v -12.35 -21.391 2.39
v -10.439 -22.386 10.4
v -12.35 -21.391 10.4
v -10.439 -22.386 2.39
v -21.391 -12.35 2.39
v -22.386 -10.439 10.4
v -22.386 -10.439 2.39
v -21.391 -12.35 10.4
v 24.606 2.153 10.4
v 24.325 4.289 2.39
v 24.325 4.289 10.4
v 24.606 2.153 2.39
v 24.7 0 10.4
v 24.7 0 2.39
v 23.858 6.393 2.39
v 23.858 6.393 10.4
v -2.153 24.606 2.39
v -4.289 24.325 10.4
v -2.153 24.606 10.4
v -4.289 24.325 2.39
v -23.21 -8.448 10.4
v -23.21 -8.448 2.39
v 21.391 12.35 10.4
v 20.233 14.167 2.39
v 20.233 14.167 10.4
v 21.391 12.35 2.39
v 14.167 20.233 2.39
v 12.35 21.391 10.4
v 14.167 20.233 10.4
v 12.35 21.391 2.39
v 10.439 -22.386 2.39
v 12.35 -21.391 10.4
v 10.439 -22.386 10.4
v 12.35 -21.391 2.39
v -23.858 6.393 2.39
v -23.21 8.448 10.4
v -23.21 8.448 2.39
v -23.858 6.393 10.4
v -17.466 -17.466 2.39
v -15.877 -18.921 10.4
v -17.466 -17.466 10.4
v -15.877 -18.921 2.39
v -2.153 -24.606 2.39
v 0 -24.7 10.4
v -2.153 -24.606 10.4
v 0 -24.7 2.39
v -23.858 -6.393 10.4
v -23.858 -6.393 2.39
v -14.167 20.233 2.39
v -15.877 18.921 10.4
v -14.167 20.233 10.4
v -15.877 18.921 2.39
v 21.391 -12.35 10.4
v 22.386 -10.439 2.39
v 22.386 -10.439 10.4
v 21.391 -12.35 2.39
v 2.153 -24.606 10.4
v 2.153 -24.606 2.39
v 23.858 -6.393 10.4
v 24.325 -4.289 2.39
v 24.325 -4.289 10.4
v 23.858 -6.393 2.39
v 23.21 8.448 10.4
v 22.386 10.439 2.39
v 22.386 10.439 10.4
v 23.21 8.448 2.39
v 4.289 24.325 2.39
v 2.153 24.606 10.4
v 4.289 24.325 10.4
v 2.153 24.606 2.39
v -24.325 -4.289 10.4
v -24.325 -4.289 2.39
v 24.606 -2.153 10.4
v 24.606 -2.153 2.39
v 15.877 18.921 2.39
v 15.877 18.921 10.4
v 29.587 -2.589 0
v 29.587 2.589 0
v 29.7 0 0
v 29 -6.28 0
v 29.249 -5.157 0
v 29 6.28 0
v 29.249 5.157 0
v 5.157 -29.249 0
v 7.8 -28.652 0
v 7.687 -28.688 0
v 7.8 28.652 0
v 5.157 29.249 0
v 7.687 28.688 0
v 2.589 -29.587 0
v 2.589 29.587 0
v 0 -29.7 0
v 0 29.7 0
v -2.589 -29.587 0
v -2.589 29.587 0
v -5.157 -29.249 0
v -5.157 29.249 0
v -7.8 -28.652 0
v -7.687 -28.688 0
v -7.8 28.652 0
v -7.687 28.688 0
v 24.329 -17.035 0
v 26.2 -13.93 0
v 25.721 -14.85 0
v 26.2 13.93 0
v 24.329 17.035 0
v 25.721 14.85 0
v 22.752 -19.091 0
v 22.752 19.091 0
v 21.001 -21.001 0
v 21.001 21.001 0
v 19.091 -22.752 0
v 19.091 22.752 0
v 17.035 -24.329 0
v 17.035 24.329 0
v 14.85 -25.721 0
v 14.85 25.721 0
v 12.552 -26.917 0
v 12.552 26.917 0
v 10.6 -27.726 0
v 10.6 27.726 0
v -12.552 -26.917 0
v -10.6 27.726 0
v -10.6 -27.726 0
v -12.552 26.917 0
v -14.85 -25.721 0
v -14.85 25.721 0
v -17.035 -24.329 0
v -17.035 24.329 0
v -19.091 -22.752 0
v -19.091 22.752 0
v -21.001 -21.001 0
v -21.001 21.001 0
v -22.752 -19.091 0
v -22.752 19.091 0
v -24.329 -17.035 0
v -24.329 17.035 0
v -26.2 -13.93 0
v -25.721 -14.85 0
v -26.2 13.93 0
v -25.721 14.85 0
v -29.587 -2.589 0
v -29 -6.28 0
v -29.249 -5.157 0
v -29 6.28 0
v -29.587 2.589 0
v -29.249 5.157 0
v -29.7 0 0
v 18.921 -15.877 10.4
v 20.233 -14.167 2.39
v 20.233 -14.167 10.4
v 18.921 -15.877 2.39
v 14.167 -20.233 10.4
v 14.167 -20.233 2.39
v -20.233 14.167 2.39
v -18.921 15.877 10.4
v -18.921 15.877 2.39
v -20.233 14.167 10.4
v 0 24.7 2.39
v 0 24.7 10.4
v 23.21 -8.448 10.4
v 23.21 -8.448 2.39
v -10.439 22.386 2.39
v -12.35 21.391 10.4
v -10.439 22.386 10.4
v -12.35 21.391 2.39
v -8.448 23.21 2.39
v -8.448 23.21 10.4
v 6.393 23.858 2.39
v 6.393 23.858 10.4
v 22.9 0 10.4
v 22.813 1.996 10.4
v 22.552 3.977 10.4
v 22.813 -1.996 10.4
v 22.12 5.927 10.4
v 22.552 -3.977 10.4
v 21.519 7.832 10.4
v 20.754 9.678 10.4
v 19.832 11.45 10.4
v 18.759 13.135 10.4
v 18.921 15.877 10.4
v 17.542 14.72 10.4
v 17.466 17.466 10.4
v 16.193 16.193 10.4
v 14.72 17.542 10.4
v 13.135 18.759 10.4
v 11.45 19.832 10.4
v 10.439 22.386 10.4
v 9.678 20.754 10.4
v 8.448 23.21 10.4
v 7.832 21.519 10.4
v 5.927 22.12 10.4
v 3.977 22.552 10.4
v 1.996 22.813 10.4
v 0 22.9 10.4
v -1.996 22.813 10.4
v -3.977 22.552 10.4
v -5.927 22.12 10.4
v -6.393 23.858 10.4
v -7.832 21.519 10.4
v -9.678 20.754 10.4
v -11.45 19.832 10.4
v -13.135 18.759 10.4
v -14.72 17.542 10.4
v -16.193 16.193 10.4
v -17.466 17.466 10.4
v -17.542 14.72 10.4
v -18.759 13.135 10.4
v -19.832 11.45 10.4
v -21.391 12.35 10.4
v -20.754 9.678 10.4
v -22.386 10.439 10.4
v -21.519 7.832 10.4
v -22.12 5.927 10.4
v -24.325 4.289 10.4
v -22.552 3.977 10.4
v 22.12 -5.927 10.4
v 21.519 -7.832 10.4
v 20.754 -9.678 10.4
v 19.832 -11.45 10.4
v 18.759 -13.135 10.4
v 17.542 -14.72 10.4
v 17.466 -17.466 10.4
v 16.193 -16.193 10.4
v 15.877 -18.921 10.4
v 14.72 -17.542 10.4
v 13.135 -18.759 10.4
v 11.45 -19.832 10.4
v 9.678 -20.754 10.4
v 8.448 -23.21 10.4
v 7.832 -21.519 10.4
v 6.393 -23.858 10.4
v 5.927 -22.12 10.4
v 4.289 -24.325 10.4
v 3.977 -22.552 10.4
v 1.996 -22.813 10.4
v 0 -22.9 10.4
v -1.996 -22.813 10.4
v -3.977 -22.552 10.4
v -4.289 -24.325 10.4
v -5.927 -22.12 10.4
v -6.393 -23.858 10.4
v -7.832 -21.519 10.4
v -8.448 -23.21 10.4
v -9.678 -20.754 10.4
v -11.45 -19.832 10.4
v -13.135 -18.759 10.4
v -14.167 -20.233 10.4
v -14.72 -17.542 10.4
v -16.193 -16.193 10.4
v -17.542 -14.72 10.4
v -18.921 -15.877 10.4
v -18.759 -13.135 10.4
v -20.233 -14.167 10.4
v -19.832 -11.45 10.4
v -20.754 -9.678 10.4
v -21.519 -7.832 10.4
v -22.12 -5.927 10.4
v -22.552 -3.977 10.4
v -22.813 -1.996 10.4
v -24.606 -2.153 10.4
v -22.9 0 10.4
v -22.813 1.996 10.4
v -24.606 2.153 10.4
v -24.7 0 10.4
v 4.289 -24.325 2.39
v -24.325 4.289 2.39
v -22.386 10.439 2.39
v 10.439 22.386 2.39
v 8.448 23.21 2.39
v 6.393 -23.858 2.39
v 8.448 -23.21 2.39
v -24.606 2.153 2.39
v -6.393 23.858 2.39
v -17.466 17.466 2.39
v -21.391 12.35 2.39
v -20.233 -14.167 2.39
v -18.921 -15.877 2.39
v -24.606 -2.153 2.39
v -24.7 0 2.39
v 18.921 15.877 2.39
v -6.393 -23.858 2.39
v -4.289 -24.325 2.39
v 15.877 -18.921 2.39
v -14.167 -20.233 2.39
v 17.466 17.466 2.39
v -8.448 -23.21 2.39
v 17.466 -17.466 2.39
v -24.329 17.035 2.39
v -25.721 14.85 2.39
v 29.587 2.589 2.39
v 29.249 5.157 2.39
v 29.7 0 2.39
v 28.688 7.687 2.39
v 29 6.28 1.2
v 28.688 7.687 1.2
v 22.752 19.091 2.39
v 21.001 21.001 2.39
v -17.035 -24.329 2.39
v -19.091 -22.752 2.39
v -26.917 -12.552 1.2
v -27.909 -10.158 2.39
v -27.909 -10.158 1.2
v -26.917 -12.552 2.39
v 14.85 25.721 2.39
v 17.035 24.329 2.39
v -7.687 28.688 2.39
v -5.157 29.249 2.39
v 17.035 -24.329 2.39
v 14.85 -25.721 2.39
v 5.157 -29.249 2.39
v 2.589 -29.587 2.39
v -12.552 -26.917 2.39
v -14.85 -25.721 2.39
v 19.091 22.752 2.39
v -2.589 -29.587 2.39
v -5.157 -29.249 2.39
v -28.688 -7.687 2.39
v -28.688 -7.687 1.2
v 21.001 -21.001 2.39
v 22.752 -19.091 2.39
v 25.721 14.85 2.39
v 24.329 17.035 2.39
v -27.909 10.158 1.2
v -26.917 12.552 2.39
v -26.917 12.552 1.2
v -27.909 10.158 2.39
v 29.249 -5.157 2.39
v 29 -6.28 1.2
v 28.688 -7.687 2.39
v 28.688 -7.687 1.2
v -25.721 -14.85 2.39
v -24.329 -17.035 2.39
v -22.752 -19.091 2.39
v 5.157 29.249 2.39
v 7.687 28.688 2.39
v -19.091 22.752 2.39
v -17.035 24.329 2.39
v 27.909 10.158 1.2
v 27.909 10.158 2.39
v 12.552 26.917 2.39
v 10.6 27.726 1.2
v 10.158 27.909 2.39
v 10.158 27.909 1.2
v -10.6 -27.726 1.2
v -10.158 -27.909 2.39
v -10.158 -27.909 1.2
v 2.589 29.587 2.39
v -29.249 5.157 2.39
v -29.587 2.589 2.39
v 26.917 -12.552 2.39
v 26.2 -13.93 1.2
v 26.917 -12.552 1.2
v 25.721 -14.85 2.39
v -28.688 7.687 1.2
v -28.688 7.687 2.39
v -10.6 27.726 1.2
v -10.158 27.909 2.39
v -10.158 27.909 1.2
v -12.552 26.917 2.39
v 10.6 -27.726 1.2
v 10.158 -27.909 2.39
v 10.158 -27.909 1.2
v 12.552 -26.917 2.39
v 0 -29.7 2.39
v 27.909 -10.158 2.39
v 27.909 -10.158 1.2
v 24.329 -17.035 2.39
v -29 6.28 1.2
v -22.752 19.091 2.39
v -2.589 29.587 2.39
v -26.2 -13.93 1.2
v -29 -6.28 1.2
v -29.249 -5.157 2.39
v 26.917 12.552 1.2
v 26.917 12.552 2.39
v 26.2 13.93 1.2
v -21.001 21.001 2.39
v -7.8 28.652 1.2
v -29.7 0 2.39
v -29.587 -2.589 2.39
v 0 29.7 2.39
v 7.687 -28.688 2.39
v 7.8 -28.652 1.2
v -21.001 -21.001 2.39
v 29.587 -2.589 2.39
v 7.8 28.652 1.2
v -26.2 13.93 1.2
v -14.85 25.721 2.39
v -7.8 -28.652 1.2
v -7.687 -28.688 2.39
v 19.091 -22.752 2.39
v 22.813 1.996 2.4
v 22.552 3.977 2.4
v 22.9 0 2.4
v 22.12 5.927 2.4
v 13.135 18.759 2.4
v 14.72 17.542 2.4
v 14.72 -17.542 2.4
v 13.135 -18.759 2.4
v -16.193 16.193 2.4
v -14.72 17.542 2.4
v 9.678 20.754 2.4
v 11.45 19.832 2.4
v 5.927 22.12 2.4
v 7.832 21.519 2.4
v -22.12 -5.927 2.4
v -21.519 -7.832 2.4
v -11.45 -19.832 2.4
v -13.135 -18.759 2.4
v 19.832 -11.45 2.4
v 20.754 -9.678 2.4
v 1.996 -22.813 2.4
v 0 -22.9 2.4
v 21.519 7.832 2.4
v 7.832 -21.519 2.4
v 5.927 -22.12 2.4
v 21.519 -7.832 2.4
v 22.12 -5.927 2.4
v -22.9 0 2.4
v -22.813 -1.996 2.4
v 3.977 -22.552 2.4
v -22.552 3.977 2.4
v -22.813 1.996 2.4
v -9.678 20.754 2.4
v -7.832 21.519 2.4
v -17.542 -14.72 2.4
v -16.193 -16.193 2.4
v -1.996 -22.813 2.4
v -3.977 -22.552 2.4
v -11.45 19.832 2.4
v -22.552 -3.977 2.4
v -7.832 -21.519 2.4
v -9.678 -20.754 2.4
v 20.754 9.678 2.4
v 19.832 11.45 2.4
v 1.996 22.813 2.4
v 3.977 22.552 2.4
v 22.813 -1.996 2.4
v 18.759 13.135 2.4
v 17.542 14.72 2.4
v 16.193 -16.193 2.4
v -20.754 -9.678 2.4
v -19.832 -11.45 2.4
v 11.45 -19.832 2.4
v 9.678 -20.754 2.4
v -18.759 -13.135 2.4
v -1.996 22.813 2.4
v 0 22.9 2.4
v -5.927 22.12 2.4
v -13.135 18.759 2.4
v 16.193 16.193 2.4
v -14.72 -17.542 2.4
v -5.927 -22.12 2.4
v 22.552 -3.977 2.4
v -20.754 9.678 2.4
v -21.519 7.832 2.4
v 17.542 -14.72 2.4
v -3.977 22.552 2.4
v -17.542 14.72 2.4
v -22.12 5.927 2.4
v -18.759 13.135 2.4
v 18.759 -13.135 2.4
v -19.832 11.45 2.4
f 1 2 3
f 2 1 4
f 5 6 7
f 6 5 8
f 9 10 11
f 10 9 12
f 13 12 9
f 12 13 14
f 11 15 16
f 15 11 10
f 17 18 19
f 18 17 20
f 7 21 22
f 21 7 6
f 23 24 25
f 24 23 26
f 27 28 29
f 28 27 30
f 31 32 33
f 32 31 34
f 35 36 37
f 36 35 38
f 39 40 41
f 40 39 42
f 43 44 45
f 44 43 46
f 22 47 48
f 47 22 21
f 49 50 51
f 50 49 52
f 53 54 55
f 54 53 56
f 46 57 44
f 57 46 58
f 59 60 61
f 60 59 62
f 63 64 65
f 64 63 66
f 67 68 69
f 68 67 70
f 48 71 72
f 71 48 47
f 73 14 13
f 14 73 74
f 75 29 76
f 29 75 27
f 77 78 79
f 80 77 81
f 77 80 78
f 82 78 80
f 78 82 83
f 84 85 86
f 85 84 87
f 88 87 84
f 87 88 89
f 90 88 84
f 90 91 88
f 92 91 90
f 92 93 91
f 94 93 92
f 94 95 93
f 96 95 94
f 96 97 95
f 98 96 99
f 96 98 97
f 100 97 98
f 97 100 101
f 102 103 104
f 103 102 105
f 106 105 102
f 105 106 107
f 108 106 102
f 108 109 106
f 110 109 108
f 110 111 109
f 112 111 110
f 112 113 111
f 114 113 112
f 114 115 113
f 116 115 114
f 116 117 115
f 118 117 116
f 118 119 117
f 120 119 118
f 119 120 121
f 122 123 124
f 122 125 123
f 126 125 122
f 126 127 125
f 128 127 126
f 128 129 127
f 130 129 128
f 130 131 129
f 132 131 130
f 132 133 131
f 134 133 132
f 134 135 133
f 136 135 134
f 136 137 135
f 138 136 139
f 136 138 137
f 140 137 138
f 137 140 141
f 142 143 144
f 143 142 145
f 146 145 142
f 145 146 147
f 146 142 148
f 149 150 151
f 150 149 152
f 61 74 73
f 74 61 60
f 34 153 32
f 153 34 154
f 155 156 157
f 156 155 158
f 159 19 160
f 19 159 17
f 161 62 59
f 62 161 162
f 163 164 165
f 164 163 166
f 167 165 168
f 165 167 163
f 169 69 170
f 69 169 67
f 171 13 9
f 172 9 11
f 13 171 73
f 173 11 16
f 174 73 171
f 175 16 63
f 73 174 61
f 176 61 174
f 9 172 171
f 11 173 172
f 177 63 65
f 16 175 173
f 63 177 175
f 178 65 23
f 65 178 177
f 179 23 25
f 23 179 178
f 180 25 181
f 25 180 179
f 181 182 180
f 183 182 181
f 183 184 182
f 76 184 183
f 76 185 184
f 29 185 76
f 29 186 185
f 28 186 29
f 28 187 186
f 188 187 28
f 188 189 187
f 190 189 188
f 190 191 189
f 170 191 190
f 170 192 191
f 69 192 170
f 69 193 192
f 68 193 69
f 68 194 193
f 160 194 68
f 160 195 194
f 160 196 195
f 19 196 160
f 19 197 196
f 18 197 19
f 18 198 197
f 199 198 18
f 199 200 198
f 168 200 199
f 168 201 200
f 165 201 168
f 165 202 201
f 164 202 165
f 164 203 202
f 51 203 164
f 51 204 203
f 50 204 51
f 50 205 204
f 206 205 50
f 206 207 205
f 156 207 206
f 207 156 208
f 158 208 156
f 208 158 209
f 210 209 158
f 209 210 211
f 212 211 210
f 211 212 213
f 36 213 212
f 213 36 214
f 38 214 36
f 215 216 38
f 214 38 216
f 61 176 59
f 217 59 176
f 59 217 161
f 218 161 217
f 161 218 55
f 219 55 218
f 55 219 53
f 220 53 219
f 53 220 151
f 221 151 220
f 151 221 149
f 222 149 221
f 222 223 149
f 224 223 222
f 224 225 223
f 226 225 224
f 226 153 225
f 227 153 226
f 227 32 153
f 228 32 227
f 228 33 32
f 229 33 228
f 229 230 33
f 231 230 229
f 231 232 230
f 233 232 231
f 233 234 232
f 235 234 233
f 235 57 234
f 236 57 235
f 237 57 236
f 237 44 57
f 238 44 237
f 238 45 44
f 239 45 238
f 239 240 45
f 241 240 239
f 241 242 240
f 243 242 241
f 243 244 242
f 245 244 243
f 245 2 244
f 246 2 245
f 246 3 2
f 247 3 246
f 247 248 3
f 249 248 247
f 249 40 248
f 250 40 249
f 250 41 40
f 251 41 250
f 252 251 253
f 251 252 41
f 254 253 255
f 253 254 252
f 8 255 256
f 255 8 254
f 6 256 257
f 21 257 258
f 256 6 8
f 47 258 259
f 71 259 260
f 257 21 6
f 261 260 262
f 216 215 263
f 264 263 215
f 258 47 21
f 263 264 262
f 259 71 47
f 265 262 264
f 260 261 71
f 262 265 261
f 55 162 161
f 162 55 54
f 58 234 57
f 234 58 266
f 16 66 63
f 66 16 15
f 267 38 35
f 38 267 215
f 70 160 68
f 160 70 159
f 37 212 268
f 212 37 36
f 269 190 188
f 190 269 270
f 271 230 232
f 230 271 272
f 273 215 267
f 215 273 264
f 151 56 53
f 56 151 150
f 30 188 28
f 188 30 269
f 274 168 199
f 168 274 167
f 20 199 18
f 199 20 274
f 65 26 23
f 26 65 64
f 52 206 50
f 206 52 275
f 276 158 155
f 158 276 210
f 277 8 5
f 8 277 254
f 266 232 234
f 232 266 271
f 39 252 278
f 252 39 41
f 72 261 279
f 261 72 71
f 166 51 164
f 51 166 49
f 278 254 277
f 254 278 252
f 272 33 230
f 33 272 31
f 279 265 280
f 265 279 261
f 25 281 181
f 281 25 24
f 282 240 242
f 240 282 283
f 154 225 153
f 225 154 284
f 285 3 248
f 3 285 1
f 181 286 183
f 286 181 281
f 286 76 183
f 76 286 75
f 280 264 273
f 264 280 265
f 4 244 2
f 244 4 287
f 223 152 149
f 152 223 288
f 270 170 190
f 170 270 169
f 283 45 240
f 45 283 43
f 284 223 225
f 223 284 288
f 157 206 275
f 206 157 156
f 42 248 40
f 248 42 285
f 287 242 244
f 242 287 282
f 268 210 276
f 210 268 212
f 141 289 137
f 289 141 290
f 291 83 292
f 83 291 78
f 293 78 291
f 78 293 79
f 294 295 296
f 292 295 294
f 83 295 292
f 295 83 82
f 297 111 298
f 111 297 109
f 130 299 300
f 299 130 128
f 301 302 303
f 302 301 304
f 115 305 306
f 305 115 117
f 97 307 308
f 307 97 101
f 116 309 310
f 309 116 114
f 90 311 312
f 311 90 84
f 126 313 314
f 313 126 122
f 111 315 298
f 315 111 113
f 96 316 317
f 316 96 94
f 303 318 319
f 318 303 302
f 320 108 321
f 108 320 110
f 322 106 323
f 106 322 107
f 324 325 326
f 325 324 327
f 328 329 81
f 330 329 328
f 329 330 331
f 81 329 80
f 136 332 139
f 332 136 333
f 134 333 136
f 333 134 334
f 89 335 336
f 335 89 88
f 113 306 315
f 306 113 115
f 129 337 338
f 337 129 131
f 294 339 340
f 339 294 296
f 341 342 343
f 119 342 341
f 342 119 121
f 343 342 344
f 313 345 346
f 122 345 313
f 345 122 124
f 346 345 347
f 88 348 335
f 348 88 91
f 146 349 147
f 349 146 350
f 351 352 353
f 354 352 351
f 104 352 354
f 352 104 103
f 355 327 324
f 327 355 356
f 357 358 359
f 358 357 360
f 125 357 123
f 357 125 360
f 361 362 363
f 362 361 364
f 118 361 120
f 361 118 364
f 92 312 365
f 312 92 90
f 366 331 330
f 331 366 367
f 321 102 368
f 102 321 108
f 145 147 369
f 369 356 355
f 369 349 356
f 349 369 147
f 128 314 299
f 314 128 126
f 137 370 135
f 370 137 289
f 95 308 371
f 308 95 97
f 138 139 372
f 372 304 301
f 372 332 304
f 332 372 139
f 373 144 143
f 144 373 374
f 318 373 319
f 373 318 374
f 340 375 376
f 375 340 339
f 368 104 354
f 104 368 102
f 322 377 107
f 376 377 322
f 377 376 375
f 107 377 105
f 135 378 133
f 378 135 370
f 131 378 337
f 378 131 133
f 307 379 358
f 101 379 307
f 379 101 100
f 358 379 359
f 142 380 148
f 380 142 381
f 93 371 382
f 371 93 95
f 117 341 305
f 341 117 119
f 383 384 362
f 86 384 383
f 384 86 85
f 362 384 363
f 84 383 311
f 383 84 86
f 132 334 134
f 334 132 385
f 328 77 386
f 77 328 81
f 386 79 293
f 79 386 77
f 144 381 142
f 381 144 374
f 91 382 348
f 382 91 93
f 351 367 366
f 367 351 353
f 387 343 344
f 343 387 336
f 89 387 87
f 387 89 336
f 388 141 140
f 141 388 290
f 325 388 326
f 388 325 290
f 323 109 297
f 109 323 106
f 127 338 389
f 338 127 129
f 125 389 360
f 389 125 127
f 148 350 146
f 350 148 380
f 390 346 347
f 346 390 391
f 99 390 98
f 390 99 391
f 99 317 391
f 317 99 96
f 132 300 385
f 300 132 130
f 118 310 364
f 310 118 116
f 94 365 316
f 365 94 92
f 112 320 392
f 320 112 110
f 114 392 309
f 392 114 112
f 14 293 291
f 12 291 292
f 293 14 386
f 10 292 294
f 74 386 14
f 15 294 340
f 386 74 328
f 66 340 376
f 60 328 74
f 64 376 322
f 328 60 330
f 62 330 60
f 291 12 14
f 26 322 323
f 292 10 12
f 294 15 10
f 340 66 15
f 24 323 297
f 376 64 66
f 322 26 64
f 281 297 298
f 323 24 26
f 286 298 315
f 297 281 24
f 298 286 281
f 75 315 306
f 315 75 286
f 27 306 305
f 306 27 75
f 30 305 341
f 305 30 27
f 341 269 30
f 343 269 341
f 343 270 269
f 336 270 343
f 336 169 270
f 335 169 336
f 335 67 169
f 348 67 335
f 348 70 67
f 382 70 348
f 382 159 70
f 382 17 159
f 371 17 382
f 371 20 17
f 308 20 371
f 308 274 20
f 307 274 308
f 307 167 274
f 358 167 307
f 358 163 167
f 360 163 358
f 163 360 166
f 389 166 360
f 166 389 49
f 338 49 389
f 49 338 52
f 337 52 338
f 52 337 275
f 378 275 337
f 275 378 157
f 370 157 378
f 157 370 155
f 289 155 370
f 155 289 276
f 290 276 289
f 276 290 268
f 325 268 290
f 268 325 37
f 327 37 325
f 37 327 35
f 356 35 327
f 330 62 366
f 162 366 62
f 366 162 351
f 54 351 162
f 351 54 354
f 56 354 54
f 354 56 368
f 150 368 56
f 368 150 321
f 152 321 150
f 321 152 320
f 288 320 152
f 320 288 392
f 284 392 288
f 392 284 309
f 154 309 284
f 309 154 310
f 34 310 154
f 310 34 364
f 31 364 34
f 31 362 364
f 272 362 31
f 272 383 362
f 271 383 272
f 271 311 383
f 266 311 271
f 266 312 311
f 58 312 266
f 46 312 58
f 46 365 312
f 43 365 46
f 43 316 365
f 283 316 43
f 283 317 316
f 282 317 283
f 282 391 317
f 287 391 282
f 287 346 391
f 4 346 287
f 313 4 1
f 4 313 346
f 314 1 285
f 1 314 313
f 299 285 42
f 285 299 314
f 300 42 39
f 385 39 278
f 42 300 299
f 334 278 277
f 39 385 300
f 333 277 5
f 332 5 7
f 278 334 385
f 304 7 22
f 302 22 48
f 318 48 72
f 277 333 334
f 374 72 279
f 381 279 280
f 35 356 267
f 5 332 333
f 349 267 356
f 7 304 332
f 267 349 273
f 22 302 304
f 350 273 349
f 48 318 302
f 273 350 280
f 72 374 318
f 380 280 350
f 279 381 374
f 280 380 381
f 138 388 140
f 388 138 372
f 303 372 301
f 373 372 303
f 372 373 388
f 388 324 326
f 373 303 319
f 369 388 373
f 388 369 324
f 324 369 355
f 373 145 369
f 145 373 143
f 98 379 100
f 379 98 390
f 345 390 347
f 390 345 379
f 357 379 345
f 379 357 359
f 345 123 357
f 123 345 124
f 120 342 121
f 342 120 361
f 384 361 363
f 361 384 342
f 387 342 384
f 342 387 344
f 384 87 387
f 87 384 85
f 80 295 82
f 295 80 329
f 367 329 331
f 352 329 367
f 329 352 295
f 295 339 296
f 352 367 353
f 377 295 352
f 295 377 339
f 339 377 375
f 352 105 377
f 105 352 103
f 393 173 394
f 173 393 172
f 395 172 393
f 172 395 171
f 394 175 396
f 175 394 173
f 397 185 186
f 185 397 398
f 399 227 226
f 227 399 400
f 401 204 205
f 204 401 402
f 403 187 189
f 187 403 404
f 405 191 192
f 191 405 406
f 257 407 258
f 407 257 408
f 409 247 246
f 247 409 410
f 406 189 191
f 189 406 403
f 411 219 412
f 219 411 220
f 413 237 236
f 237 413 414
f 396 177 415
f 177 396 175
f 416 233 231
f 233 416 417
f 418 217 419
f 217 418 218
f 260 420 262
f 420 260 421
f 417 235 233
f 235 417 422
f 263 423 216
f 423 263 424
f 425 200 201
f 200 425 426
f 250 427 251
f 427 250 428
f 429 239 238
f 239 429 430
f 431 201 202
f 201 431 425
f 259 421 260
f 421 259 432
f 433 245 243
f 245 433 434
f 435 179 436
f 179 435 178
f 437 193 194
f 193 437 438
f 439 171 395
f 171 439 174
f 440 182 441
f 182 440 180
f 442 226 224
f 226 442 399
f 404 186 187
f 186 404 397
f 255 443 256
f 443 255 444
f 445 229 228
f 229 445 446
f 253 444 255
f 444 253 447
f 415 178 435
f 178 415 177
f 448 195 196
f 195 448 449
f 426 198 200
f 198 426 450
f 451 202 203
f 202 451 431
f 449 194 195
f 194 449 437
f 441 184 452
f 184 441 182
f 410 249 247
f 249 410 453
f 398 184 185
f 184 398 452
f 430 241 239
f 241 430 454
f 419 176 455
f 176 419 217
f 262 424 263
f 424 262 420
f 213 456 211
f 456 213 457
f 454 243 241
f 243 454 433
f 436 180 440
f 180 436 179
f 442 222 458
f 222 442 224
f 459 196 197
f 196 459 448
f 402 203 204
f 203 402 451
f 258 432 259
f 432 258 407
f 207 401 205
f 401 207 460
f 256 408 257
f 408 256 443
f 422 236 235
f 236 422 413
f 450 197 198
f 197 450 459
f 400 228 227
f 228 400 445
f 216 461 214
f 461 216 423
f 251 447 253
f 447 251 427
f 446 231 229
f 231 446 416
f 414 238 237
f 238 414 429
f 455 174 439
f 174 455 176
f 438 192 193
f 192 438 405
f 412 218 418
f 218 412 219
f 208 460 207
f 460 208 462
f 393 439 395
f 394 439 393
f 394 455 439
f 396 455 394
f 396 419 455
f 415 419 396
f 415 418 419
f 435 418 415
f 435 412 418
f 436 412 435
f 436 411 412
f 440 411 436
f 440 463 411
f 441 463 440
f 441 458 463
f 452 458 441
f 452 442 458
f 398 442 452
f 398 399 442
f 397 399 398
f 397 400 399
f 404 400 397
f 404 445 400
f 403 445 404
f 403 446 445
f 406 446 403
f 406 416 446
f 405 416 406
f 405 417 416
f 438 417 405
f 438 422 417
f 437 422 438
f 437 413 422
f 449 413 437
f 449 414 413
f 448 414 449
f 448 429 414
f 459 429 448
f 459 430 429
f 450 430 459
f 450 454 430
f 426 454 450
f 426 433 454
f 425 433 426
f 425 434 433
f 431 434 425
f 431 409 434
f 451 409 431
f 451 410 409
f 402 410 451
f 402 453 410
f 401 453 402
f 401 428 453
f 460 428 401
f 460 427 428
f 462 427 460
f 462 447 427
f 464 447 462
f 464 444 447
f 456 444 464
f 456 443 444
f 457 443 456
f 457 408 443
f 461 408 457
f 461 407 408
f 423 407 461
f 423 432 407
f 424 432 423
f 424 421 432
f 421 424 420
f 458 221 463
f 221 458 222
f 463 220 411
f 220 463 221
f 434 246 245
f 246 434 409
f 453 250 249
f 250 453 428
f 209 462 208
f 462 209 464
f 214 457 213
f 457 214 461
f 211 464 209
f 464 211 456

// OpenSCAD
// -*- mode: SCAD ; c-file-style: "ellemtel" ; coding: utf-8 -*-
//
// A simple “coaster” to stop condiment bottles from falling over when
// placed on the bars of a the grid in the fridge
//
// © 2018 Roland Sieker <ospalh@gmail.com>
// Licence: CC-BY-SA 4.0


// Set this to “render” and click on “Create Thing” when done with the setup.
preview = 1; // [0:render, 1:preview]

spacing = 18.4;
bar_width = 2.8;
height = 8;
diameter = 45;
flange = 5;

/* [Hidden] */

// Done with the customizer

// *******************************************************
// Extra parameters. These can be changed reasonably safely.


w = 1.8;  // Wall width
p = 1.2;  // Bottom, top plate height
c = 0.4;  // Clearance
angle = 60; // Overhangs much below 60° are a problem for me

// *******************************************************
// Some shortcuts. These shouldn’t be changed

tau = 2 * PI;  // π is still wrong. τ = ⌀ ÷ r

xy_factor = 1/tan(angle);
// To get from a height to a horizontal width inclined correctly
z_factor = tan(angle);  // The other way around


rie = diameter/2 + c;

some_distance = 50;
ms = 0.01;  // Muggeseggele.

// fn for differently sized objects and fs, fa; all for preview or rendering.
pna = 40;
pnb = 15;
pa = 5;
ps = 1;
rna = 180;
rnb = 30;
ra = 1;
rs = 0.1;
function na() = (preview) ? pna : rna;
function nb() = (preview) ? pnb : rnb;
$fs = (preview) ? ps : rs;
$fa = (preview) ? pa : ra;

// *******************************************************
// End setup



// *******************************************************
// Generate the parts

fridge_coaster();

// *******************************************************
// Code for the parts themselves


module fridge_coaster()
{
   hrc = ceil((rie+w+bar_width+flange)/spacing) + 1;
   difference()
   {
      union()
      {
         cylinder(r=rie+w, h=2*p+height);
         cylinder(r=rie+w+flange, h=2*p-ms);
      }
      translate([0,0,2*p])
      {
         cylinder(r=rie, h=height+ms);
      }
      for (o=[-hrc:hrc])
      {
         echo(o);
         translate([(o+0.5)*spacing,0, 0])
         {
            cube([bar_width, 2*(rie+w+c+bar_width+flange+ms), 2*p], center=true);
         }
      }
   }
}
